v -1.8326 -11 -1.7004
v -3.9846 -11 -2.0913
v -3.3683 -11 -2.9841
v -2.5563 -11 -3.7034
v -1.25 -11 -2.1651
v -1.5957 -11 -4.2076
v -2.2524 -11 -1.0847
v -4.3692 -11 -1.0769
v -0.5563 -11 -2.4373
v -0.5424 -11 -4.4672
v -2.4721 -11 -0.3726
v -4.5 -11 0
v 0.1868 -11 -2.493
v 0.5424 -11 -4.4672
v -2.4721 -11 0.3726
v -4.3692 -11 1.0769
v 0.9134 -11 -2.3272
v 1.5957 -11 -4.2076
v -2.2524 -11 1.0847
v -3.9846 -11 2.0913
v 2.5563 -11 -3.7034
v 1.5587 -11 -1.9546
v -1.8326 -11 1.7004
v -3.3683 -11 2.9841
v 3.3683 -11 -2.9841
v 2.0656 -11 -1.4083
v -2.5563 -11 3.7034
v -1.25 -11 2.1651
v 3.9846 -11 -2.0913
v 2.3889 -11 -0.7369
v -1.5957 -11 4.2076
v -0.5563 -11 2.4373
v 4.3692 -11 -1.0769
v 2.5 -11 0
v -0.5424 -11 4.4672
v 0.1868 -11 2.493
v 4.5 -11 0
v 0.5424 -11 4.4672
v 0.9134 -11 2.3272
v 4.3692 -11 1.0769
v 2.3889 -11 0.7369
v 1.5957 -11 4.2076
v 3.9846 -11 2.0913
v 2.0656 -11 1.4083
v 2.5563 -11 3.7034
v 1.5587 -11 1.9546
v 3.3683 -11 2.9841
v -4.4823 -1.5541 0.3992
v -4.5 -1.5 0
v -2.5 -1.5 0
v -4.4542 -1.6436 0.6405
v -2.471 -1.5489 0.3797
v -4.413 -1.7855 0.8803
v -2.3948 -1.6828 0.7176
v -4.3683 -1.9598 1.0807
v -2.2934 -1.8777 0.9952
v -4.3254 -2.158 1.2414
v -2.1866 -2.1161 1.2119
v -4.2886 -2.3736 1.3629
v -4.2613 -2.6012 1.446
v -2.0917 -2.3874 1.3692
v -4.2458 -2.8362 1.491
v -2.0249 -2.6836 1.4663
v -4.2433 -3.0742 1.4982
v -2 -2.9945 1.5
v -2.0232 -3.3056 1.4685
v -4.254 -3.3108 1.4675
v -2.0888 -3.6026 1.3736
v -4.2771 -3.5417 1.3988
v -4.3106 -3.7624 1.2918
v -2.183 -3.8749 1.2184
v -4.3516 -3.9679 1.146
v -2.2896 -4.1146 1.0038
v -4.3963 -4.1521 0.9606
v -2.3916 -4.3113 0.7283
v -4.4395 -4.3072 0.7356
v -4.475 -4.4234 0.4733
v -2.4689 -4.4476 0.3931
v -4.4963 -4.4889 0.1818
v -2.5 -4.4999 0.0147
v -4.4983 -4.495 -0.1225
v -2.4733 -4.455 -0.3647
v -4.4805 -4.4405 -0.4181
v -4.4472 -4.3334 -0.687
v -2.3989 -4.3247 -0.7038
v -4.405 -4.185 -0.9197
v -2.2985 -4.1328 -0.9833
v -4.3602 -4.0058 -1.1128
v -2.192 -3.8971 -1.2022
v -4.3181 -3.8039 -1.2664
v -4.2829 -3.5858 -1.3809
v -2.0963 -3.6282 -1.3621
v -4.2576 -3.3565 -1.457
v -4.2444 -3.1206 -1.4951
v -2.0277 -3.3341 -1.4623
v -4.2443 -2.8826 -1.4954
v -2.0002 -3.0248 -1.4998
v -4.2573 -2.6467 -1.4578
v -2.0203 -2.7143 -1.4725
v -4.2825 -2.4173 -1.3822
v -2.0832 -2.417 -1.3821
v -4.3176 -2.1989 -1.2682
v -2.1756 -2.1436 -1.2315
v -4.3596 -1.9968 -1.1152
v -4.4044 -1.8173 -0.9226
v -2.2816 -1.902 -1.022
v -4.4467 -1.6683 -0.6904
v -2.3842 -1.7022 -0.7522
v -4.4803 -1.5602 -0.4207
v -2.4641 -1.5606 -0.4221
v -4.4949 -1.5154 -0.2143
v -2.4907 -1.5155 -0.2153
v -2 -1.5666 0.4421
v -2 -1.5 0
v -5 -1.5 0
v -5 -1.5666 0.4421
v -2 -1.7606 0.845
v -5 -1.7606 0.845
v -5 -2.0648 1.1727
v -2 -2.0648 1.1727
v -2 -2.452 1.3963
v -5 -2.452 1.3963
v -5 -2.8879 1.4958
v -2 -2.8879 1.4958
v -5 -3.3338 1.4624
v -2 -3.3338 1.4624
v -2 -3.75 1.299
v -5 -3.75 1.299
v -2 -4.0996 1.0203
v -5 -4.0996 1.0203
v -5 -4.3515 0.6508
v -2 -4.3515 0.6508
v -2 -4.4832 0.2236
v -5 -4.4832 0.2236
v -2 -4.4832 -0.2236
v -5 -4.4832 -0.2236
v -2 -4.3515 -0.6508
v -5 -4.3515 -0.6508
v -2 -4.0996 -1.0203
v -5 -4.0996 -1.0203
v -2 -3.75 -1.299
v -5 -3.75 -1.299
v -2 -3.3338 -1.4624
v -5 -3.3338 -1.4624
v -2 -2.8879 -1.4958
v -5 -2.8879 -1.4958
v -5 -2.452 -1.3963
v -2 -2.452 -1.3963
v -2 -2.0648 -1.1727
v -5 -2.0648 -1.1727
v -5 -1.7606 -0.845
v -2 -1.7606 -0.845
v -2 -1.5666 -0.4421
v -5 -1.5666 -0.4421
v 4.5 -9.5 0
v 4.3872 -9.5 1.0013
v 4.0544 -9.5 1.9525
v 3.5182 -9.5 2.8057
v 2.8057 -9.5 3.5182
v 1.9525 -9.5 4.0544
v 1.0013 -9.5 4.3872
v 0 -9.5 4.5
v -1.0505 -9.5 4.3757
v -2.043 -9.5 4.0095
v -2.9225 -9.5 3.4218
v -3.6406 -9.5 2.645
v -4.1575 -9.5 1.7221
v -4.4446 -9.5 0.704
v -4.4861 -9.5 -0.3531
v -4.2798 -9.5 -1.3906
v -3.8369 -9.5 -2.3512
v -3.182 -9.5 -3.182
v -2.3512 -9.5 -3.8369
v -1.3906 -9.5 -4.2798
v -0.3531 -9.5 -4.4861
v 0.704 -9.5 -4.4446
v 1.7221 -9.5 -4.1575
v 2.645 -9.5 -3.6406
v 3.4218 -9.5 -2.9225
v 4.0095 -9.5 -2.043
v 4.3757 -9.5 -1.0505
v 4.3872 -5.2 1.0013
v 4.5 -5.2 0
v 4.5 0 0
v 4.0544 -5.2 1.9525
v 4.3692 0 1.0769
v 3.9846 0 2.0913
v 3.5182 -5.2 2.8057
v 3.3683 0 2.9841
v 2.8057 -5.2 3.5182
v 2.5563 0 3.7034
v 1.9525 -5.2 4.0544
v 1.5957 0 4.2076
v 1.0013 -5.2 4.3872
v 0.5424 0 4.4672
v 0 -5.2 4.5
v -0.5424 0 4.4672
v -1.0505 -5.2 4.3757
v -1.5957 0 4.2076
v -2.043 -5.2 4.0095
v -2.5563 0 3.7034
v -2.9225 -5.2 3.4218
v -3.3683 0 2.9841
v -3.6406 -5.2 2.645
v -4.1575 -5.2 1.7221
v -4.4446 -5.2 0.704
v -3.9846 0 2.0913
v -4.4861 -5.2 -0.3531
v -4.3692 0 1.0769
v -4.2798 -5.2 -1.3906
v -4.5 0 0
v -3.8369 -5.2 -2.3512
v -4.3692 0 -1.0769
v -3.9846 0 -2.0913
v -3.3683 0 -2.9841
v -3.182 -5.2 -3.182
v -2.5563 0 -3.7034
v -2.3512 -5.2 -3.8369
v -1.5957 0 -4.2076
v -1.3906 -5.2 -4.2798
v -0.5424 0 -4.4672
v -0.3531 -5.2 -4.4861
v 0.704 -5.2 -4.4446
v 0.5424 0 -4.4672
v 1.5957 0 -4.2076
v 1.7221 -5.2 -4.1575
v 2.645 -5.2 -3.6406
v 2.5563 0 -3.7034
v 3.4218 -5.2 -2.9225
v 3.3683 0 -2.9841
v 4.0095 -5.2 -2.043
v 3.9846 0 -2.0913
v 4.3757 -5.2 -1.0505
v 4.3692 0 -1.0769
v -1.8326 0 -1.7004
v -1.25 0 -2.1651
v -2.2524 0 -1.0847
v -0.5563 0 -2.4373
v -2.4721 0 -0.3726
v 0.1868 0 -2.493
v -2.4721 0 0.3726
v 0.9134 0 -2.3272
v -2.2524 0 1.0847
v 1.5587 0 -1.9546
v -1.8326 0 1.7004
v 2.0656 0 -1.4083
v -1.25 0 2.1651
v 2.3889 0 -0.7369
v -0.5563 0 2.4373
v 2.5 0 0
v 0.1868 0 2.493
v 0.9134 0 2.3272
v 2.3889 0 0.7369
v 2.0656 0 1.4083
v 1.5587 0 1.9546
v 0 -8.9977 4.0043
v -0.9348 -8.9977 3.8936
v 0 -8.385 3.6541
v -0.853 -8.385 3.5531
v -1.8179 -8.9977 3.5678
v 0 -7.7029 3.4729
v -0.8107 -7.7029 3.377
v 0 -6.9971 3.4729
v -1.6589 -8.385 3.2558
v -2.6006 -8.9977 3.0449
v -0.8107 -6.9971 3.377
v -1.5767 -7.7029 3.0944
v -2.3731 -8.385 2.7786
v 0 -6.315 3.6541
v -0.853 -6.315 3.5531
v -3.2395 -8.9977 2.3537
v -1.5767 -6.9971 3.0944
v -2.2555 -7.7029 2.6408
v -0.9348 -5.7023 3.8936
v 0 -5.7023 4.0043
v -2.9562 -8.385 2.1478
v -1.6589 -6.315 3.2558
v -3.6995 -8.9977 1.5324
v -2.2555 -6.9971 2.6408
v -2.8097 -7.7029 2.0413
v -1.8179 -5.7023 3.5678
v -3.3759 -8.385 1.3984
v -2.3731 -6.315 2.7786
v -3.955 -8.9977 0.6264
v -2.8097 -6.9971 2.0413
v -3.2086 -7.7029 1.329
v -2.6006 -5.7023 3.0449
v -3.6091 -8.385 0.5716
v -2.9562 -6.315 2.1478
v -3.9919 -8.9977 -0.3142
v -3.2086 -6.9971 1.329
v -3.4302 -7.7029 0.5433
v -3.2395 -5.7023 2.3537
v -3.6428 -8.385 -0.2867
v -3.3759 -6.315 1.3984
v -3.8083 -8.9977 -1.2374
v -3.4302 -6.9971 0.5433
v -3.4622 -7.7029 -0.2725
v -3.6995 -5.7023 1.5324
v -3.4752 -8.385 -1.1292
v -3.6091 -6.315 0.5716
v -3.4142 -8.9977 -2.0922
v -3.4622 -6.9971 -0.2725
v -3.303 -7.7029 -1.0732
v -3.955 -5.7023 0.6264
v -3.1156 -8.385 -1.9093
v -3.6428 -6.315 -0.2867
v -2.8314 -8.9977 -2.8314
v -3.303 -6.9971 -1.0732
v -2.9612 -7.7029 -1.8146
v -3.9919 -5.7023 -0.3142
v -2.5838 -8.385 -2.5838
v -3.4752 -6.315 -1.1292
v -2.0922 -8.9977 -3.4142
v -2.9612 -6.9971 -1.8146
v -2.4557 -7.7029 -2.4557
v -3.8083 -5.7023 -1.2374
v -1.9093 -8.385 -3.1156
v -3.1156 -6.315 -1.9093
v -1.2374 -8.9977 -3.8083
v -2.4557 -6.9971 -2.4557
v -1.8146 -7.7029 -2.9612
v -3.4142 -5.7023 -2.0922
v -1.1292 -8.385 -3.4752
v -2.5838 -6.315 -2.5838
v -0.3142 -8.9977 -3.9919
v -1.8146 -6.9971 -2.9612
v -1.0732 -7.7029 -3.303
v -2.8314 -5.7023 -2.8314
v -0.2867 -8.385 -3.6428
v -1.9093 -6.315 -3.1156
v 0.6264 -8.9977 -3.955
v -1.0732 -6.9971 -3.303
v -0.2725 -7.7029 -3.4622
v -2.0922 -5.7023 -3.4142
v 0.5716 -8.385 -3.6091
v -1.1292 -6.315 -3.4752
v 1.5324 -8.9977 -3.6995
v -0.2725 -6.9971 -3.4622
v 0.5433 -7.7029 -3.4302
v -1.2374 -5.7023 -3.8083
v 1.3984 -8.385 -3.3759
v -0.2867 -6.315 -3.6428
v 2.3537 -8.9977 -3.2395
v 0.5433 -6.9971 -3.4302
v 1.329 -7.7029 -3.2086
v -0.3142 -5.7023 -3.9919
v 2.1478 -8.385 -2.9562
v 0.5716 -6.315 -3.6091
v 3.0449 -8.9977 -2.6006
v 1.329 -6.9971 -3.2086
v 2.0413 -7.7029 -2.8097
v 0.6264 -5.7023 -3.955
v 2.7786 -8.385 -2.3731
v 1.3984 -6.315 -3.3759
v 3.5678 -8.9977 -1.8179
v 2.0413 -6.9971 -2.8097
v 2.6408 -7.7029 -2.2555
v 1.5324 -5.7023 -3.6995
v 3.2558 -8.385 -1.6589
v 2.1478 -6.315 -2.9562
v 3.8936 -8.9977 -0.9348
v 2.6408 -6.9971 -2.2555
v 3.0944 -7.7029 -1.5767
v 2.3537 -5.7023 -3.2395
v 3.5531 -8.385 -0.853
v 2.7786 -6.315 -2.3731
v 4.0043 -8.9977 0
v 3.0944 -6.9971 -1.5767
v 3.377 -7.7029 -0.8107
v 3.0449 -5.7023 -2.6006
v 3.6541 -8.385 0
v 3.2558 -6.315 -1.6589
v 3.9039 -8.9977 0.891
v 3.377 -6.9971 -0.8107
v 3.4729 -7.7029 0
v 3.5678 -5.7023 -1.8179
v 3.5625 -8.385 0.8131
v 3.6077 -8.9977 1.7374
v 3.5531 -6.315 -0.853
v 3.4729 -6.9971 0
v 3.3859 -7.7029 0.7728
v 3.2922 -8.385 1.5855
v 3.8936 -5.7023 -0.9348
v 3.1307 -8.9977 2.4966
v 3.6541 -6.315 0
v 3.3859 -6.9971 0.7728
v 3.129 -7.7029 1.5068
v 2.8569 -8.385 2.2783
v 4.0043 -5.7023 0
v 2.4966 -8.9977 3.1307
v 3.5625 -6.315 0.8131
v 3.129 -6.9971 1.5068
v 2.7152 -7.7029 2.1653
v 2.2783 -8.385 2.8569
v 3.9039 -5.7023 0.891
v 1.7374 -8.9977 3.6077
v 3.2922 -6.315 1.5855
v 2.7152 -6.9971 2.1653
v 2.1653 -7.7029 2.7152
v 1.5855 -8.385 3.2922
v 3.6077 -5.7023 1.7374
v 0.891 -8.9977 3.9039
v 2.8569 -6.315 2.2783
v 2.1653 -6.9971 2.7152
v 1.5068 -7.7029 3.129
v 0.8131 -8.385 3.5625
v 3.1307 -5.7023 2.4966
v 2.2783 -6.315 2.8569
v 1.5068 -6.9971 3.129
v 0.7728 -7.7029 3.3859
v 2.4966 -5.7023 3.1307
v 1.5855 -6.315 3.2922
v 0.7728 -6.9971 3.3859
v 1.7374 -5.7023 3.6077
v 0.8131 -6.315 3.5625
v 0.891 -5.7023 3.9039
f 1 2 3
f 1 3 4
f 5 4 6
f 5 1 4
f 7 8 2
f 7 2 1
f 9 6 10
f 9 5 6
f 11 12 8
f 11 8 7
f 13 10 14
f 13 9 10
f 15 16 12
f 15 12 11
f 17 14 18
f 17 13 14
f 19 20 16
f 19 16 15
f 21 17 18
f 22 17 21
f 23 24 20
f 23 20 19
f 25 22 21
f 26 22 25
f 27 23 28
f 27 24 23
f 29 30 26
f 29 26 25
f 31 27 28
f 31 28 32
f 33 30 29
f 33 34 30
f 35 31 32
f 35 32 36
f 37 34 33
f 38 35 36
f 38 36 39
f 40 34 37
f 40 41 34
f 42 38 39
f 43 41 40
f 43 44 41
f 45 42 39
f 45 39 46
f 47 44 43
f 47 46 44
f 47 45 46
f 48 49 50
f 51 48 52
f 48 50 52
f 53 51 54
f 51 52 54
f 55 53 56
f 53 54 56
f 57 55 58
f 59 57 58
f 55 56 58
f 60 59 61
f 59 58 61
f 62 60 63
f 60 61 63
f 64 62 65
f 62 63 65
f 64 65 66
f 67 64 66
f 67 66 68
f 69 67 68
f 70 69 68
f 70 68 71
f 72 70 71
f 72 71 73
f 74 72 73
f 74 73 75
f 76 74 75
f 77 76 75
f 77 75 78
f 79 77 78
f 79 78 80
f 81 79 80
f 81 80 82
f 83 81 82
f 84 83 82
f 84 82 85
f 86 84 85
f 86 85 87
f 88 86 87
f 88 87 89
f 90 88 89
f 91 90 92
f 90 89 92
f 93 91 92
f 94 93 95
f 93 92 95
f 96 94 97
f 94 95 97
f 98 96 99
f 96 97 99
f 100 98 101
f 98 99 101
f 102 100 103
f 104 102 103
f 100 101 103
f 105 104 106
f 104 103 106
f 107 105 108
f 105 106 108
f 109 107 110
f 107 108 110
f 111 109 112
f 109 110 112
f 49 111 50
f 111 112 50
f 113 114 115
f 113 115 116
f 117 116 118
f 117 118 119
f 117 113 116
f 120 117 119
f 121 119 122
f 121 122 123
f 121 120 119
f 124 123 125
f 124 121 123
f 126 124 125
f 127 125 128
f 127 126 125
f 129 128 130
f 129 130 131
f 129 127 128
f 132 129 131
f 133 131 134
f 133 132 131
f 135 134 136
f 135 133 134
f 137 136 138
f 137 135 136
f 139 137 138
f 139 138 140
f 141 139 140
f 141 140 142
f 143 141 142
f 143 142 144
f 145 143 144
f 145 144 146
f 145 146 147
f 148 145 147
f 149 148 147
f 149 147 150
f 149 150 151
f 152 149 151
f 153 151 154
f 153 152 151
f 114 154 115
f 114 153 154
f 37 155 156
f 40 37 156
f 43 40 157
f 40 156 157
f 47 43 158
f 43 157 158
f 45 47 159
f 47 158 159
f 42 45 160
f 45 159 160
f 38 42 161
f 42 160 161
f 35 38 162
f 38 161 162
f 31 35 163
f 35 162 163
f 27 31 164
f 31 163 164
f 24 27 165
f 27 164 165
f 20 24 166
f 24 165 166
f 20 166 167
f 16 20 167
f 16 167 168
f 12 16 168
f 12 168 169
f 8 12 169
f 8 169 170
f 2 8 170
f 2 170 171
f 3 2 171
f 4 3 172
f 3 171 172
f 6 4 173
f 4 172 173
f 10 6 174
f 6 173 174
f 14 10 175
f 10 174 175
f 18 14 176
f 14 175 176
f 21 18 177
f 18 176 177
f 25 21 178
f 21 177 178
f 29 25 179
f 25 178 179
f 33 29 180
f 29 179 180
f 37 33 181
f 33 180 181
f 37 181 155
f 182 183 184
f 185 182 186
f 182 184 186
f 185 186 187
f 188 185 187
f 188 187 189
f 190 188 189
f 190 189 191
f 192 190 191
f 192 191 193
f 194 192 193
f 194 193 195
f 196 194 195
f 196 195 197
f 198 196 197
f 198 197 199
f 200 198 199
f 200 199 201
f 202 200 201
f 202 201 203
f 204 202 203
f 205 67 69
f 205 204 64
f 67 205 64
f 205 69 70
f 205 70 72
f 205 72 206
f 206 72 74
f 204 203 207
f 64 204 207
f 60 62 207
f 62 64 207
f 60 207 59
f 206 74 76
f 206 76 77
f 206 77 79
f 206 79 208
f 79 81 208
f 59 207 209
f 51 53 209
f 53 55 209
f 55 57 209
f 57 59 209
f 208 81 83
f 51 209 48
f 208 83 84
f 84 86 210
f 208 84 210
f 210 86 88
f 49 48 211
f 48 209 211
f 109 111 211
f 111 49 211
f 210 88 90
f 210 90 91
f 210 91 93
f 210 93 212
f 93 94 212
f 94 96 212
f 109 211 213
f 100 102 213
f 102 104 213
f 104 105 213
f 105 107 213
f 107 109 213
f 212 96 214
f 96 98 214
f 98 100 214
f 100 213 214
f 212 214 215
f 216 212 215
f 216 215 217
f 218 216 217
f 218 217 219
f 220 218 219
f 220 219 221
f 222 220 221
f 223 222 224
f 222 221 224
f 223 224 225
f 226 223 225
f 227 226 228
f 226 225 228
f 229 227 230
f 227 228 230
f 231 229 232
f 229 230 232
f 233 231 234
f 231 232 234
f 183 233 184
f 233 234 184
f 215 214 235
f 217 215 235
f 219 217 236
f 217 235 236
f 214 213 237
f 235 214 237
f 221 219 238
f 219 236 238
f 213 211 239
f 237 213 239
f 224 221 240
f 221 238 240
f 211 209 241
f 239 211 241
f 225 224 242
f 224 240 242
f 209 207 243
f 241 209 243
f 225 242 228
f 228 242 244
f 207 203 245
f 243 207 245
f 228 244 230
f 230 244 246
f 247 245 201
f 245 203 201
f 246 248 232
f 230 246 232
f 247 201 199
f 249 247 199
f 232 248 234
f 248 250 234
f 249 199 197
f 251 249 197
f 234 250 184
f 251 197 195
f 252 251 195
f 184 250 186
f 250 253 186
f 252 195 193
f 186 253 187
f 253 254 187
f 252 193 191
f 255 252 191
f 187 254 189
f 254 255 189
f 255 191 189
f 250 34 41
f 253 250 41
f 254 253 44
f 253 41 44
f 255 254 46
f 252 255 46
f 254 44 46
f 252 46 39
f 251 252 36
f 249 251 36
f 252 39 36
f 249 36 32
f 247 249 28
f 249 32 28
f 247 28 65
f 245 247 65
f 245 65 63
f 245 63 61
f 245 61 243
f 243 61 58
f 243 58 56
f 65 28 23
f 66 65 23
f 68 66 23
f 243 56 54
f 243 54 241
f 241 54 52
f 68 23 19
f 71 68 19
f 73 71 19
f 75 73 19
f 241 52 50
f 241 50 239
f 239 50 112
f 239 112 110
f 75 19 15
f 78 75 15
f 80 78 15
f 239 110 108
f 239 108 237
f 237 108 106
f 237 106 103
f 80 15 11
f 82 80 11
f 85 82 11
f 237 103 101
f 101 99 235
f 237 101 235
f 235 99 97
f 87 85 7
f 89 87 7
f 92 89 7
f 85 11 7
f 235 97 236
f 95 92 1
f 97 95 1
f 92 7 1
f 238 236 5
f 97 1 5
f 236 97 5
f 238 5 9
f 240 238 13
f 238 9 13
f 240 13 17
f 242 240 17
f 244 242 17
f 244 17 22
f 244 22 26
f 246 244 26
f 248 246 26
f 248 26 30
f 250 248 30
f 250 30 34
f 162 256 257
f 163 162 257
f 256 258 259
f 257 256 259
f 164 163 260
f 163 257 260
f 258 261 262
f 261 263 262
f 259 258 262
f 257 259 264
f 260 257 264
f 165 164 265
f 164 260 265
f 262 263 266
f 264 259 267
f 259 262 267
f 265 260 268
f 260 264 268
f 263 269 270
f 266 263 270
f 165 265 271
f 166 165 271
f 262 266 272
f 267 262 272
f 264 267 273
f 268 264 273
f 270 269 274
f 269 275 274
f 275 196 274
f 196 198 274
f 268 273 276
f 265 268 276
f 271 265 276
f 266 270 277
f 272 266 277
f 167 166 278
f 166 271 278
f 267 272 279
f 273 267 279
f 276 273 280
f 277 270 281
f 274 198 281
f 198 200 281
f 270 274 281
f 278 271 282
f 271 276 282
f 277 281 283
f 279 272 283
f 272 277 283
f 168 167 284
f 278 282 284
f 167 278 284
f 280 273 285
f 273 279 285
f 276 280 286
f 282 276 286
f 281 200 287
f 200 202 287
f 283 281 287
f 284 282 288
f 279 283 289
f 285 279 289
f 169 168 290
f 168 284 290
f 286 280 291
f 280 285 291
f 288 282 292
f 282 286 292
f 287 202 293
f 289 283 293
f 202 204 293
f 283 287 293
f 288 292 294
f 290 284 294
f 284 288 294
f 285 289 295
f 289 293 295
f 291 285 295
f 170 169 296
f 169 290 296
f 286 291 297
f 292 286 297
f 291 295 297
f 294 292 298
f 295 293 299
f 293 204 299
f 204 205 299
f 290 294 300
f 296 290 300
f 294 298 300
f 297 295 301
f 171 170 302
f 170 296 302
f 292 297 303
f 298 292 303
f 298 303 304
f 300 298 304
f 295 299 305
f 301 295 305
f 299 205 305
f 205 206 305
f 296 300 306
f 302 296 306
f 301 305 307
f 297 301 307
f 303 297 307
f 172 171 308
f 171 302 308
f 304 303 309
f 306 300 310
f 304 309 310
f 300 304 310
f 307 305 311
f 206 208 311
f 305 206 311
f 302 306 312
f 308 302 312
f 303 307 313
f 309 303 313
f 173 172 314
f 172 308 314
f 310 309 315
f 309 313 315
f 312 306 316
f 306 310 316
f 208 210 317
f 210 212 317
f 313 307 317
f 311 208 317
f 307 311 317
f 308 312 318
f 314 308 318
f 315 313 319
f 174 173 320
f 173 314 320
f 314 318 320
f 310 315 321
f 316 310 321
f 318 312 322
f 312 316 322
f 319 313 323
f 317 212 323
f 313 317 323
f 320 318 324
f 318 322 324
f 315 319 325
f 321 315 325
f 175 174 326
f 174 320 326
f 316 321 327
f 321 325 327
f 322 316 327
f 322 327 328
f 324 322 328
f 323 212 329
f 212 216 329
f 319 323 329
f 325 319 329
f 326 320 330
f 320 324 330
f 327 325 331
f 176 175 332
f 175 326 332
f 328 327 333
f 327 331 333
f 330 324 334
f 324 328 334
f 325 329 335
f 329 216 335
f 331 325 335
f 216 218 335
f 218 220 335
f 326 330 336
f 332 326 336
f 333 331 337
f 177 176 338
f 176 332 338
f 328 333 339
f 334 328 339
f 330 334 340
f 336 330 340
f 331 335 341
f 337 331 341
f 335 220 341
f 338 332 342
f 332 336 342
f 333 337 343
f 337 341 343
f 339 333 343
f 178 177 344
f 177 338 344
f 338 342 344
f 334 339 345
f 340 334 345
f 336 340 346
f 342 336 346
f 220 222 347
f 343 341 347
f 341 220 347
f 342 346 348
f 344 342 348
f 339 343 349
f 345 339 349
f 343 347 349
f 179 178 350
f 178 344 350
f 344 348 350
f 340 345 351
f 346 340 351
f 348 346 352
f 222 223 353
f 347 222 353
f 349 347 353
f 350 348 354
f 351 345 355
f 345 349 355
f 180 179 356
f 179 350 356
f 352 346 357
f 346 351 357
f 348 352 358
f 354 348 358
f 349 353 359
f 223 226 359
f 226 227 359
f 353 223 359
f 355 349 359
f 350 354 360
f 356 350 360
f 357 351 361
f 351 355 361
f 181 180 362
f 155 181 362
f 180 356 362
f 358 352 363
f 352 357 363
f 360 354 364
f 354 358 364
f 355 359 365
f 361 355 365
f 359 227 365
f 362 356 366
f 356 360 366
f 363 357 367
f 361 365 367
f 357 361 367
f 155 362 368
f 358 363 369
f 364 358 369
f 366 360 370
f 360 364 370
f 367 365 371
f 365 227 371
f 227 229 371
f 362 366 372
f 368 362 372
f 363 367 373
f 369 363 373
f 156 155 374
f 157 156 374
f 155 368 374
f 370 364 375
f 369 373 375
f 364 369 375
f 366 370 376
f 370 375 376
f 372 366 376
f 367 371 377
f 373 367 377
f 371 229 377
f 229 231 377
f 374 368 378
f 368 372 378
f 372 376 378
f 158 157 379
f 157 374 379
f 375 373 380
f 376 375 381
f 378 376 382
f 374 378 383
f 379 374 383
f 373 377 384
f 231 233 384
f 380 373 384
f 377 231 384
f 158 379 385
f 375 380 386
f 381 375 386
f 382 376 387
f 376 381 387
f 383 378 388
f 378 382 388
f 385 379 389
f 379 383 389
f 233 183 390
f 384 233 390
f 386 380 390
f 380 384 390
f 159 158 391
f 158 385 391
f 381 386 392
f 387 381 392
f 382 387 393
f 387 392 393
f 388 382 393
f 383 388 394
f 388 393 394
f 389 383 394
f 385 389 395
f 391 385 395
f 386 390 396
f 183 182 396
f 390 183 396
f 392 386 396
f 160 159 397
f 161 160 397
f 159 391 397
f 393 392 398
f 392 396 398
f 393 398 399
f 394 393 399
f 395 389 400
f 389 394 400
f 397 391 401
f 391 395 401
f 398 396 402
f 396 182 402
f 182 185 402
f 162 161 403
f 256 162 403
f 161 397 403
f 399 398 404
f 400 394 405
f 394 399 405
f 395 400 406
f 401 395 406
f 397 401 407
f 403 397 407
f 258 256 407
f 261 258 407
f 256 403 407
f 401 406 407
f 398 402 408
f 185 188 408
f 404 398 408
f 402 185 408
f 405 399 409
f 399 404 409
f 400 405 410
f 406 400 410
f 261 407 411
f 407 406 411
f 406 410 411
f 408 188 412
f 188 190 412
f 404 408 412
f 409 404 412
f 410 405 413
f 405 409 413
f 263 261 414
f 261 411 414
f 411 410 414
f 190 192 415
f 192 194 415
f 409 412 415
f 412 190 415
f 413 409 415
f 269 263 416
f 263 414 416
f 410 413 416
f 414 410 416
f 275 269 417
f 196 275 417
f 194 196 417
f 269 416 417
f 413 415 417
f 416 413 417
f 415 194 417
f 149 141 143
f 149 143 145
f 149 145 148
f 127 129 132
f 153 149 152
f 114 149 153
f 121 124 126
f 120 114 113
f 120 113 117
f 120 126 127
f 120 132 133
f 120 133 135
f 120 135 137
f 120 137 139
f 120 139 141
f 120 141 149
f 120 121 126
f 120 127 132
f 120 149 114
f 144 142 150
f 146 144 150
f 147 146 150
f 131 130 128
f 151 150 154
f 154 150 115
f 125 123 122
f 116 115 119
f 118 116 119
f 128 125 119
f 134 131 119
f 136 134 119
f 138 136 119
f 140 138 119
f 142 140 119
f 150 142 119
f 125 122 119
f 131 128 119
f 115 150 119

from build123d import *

# Parameters (mm, degrees)
F0_R     = 4.5
F1_DEPTH = 11
F2_R     = 2.5
F3_DEPTH = 11.001
F6_R     = 1.5
F7_DEPTH = 4.501
F8_START = -2
F8_DEPTH = 3


with BuildPart() as f1:
    # F0 (on Front) → F1 (new body)
    with BuildSketch(Plane.XZ):
        Circle(F0_R)
    extrude(amount=F1_DEPTH)

    # F2 (on face) → F3 (cut, through all)
    with BuildSketch(Plane.XZ.offset(11)):
        Circle(F2_R)
    extrude(amount=-F3_DEPTH, mode=Mode.SUBTRACT)

    # F4 (on Right) → F5 (revolve, cut)
    with BuildSketch(Plane.YZ):
        with BuildLine():
            Line((-5.2, 4.5), (-9.5, 4.5))
            ThreePointArc((-9.5, 4.5), (-7.35, 3.45), (-5.2, 4.5))
        make_face()
    revolve(axis=Axis((0, -8.025, 0), (0, -1, 0)), mode=Mode.SUBTRACT)

    # F6 (on Right) → F7 (cut, through all)
    with BuildSketch(Plane.YZ):
        with Locations((-3, 0)):
            Circle(F6_R)
    extrude(amount=-F7_DEPTH, mode=Mode.SUBTRACT)


with BuildPart() as f8:
    # F6 (on Right) → F8 (new body)
    with BuildSketch(Plane.YZ.offset(F8_START)):
        with Locations((-3, 0)):
            Circle(F6_R)
    extrude(amount=-F8_DEPTH)


solid = Compound([f1.part, f8.part])
